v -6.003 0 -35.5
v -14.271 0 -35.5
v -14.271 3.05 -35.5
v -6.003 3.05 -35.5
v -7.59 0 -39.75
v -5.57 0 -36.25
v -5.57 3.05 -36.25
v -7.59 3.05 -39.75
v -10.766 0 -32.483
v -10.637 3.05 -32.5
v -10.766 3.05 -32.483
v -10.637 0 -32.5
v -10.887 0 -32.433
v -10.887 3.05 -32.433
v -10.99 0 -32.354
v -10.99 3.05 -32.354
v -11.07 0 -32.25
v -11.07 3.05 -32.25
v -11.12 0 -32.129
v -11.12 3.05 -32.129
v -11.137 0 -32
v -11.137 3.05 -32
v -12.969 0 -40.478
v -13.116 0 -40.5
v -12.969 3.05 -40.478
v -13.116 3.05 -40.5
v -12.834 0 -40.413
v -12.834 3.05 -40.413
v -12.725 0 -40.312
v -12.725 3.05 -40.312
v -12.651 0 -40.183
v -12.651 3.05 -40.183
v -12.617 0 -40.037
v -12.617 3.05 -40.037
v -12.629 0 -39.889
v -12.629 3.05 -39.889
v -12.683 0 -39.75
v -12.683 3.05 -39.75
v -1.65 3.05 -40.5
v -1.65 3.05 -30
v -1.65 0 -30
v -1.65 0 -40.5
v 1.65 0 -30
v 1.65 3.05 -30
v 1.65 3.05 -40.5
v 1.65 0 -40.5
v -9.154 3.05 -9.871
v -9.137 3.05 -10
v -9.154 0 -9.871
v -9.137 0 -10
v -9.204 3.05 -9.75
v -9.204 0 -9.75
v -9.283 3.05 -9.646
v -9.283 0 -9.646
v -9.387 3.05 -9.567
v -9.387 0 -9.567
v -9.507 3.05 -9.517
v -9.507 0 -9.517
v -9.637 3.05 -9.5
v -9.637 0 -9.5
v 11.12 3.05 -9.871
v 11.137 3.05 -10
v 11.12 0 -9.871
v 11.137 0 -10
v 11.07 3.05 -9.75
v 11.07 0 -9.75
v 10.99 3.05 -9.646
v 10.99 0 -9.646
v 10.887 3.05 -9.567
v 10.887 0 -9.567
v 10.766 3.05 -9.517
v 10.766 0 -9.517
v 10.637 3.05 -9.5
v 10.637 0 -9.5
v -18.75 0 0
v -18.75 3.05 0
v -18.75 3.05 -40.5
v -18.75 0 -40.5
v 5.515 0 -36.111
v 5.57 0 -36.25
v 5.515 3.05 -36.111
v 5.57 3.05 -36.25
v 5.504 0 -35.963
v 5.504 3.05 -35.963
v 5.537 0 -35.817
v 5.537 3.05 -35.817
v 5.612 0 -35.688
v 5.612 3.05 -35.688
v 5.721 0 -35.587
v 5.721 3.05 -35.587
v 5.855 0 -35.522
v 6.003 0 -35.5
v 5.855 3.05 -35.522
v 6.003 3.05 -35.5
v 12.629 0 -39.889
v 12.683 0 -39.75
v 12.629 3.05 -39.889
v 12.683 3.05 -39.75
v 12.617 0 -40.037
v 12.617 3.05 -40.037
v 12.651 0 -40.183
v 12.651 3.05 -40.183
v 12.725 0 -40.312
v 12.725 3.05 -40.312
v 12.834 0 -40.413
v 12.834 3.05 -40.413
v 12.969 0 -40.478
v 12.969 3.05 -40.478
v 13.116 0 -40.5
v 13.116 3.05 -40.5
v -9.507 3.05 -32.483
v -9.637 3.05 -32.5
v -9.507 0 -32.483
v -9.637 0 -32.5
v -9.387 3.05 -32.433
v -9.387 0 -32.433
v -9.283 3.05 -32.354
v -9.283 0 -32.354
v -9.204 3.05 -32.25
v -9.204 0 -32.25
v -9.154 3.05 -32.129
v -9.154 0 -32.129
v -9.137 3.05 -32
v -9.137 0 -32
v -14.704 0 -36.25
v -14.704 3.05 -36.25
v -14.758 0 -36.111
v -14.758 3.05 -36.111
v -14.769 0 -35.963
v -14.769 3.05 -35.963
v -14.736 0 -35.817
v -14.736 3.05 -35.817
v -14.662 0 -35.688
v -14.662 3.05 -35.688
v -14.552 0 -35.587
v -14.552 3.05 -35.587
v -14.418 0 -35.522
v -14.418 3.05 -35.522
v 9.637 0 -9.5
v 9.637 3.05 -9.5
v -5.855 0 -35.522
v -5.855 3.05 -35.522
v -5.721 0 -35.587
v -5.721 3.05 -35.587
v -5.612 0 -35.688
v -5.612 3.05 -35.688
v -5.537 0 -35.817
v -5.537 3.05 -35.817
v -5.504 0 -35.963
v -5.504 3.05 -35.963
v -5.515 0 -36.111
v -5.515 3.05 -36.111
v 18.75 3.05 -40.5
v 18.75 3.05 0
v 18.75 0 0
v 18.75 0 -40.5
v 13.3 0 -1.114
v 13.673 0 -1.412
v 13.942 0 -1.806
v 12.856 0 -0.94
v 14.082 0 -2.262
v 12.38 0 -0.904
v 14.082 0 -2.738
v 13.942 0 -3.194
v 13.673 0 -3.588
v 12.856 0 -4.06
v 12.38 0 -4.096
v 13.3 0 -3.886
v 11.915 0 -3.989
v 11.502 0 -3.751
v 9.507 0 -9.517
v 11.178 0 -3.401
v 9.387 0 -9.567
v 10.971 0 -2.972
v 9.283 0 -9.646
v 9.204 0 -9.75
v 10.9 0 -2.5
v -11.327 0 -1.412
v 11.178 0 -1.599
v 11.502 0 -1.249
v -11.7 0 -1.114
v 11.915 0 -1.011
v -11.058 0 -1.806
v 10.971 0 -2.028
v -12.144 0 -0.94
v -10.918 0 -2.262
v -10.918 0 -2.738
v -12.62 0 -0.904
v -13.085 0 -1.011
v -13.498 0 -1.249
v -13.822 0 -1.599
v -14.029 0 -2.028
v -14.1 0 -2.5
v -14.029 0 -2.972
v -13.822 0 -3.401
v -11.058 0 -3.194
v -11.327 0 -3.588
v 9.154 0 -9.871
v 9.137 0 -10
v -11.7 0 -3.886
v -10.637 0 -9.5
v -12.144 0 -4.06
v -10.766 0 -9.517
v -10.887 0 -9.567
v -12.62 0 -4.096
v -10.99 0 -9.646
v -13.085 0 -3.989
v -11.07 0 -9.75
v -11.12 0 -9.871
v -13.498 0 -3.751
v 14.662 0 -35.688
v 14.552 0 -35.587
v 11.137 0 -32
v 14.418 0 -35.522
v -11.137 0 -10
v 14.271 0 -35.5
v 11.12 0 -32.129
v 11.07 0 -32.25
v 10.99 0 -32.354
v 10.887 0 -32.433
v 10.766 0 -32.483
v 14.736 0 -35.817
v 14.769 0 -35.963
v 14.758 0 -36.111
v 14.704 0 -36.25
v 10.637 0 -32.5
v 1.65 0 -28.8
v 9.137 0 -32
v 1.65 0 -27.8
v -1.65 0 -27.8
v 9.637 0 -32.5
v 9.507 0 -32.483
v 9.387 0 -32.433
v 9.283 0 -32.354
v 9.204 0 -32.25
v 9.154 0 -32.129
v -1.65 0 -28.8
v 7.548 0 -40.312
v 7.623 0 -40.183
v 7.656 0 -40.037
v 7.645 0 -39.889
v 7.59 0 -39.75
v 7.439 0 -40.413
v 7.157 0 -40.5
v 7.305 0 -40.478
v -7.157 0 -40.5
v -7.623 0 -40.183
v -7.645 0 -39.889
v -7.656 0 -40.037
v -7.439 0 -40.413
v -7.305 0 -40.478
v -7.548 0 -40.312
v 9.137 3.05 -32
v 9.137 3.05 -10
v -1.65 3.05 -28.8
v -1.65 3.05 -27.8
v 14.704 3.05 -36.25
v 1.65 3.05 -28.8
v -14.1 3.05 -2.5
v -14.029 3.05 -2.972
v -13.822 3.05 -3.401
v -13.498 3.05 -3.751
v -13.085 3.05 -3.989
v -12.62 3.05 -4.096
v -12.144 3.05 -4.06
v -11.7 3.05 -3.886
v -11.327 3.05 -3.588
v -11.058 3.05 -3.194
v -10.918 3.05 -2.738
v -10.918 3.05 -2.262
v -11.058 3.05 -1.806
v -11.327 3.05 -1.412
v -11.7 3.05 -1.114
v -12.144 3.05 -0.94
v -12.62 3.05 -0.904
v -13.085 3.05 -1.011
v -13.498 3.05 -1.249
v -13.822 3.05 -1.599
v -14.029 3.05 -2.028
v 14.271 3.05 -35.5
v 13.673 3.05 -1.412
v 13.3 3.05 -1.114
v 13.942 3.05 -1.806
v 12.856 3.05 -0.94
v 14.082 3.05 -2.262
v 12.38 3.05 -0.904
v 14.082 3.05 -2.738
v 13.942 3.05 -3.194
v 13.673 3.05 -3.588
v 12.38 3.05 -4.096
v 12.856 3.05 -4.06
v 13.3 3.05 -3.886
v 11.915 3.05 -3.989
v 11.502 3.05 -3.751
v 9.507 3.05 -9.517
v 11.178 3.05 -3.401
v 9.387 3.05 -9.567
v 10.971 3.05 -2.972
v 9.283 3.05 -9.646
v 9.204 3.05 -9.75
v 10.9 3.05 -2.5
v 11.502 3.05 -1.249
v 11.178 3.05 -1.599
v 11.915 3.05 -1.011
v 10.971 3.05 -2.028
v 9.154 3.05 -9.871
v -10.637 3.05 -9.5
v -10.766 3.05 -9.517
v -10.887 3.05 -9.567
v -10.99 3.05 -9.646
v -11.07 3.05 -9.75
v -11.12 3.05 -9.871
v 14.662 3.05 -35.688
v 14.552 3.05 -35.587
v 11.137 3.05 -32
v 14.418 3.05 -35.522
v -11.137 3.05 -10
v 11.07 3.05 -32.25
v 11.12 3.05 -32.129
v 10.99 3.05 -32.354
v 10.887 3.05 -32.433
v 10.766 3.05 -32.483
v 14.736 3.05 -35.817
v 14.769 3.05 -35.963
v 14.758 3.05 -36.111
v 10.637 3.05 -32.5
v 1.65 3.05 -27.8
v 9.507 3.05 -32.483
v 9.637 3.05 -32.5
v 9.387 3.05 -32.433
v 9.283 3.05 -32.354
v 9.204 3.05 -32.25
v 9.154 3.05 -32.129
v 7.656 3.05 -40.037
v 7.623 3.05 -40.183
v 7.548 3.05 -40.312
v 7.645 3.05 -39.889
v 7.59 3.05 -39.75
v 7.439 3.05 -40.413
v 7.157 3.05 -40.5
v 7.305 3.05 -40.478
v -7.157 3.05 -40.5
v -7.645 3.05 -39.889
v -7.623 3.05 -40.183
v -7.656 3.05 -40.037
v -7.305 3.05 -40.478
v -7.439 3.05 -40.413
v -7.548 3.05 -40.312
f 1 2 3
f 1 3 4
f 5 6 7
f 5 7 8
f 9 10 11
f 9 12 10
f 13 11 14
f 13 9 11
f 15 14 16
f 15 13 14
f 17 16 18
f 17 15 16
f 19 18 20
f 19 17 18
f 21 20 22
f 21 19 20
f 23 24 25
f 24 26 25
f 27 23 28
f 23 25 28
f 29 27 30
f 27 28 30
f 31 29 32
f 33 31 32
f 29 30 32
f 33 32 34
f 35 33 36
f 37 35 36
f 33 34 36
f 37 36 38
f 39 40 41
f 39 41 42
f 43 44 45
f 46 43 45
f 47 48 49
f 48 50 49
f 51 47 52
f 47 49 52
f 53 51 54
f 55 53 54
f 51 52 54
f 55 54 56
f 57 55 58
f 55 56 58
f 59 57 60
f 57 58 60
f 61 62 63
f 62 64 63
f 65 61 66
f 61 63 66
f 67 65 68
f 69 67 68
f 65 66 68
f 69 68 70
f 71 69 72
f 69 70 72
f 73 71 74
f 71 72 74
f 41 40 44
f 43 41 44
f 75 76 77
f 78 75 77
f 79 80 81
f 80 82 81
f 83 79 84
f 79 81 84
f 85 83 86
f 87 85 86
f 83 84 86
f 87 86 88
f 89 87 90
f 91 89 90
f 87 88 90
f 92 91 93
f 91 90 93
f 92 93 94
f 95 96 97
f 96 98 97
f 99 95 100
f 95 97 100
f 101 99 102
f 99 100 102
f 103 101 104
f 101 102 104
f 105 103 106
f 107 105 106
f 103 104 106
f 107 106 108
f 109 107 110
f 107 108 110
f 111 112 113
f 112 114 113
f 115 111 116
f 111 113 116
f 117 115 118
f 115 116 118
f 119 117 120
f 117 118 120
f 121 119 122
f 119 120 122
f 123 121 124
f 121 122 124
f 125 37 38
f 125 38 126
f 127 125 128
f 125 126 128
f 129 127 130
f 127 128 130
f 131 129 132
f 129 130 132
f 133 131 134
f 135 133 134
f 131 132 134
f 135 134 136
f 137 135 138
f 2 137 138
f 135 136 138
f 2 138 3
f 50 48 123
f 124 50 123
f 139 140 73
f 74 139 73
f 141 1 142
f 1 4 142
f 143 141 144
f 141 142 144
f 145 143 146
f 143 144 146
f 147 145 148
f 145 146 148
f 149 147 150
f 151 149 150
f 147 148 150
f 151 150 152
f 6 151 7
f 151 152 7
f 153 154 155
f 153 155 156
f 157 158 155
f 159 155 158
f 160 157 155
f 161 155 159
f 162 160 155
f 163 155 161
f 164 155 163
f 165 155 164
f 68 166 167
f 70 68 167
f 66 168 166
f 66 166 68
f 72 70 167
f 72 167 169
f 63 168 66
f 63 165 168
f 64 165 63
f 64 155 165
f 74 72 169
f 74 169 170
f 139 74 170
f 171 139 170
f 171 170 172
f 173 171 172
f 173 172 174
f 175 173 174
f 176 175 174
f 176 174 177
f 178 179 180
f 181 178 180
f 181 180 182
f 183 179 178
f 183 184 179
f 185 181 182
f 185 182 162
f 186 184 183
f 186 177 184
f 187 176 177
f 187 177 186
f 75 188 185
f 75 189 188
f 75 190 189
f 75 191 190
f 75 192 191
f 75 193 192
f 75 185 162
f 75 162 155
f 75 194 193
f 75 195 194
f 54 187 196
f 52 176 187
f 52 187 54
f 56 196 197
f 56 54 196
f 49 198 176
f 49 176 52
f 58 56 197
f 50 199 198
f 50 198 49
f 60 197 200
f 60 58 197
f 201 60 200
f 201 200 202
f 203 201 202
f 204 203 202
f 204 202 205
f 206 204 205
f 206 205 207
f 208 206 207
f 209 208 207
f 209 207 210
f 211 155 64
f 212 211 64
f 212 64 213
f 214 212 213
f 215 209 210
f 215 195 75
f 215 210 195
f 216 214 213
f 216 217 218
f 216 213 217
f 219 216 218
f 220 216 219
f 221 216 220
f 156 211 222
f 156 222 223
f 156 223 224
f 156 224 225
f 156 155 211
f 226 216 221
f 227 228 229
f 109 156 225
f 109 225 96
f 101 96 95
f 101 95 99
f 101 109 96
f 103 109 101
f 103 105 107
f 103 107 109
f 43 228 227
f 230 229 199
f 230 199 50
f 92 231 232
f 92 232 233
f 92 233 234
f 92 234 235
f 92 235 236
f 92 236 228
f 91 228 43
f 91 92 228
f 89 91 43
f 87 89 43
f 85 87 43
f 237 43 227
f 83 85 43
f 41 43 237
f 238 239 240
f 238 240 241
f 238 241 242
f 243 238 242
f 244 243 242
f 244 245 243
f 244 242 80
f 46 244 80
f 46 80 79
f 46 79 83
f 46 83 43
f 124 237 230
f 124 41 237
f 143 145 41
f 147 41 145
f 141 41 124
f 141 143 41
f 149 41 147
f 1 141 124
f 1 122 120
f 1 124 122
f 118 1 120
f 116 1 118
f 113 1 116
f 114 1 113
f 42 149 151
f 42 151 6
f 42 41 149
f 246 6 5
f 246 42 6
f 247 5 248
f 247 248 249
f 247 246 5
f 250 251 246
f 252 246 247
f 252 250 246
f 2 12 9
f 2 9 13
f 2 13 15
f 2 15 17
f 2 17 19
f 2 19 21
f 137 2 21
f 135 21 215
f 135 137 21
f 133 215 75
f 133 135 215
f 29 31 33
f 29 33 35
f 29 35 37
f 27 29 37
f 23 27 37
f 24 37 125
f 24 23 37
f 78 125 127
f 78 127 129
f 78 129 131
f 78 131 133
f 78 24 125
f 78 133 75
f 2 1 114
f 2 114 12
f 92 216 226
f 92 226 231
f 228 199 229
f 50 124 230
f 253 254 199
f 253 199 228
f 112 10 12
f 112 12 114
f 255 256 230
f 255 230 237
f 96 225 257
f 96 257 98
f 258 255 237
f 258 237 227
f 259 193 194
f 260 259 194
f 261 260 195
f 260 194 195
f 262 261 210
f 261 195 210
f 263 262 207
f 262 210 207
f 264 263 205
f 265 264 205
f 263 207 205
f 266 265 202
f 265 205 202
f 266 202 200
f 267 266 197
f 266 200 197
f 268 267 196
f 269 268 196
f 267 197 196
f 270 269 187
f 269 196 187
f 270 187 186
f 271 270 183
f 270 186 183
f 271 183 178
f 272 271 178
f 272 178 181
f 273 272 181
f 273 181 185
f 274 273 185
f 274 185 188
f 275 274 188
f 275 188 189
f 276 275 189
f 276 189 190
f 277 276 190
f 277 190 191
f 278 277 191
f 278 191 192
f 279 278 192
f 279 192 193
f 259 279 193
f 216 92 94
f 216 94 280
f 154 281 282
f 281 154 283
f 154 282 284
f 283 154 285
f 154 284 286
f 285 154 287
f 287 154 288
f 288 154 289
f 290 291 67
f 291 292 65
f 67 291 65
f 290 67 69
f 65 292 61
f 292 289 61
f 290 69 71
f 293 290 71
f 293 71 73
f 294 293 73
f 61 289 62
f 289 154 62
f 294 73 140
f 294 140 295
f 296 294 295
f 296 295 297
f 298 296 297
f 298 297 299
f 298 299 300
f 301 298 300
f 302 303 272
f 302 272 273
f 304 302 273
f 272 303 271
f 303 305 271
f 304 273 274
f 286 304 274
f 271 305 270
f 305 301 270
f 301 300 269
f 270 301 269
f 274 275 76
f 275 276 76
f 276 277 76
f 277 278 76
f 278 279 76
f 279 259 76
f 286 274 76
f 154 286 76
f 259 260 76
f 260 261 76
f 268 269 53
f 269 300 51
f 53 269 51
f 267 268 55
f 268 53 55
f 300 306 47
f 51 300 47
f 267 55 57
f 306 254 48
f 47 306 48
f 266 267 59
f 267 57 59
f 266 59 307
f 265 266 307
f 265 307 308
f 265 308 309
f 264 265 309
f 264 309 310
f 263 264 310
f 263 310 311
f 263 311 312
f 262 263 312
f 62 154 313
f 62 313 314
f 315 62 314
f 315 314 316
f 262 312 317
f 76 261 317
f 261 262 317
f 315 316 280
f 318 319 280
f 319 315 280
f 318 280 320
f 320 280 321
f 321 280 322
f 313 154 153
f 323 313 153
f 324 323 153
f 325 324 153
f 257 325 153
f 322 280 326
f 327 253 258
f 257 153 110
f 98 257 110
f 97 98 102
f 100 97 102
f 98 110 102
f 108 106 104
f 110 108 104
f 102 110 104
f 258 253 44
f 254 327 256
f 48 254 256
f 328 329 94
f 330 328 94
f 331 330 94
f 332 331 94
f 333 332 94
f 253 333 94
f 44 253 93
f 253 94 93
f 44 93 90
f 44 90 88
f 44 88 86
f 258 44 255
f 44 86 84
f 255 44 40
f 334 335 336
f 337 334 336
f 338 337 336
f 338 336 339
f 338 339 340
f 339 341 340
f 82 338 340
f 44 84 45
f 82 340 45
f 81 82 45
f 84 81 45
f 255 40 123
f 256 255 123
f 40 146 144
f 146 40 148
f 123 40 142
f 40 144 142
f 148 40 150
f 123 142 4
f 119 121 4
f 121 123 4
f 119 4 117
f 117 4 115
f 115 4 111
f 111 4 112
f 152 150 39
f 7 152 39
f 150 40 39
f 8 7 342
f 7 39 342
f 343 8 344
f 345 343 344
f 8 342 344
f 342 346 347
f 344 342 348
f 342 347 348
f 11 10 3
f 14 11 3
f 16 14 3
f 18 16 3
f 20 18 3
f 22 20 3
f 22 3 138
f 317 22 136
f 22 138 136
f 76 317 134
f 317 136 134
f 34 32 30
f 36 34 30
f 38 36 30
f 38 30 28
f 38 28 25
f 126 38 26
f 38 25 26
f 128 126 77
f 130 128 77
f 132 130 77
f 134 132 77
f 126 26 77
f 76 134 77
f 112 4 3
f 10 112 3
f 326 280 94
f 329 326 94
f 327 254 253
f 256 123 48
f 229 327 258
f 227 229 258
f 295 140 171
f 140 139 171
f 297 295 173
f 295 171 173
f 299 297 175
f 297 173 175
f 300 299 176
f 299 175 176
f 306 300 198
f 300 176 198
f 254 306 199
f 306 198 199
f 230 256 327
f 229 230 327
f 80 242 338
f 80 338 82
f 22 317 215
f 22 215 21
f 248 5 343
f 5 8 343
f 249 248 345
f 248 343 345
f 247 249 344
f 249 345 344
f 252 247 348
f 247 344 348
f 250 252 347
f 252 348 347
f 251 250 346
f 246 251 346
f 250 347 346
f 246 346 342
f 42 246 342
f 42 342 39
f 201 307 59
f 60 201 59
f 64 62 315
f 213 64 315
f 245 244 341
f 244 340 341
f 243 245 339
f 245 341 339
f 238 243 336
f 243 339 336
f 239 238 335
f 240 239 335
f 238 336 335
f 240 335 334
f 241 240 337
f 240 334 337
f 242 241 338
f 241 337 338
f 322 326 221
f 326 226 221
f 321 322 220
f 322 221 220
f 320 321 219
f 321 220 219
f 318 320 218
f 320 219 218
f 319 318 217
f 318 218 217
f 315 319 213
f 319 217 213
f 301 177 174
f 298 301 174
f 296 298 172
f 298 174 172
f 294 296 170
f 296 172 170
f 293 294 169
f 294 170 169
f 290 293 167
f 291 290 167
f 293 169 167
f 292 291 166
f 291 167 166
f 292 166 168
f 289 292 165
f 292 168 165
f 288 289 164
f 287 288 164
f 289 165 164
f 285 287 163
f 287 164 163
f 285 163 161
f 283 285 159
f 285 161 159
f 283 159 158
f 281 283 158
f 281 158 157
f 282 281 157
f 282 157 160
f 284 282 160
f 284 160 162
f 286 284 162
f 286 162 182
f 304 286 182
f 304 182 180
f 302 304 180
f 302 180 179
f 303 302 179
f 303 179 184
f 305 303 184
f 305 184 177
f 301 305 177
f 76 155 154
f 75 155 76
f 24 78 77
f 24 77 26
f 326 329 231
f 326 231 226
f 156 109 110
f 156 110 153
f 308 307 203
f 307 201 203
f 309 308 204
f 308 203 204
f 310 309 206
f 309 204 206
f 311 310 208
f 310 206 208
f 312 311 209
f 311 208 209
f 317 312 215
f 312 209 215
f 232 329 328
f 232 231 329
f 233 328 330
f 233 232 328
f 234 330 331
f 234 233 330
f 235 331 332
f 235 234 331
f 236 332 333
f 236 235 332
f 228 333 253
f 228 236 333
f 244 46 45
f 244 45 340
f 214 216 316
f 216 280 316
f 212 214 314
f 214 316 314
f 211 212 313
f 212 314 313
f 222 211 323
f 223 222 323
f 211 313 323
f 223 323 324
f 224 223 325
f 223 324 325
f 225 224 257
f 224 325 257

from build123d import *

# Parameters (mm, degrees)
BOSS_EXTRUDE1_DEPTH                = 3.05
FILLET3_R                          = 0.5
SKETCH2_W                          = 3.3
SKETCH2_H                          = 46
SKETCH2_H_2                        = 1
CUT_EXTRUDE1_DEPTH                 = 45.945689448
SKETCH6_W                          = 2
SKETCH6_H                          = 23
CUT_EXTRUDE2_DEPTH                 = 45.945689448
FILLET4_R                          = 0.5
M3_CLEARANCE_HEAD_MOUNTING_HOLES_D = 3.2
SKETCH7_W                          = 0.5
SKETCH7_H                          = 40.5
CUT_EXTRUDE3_DEPTH                 = 45.945689448


with BuildPart() as part:
    # Sketch1 → Boss-Extrude1 (new body)
    with BuildSketch(Plane(origin=(0, 0, 0), x_dir=(1, 0, 0), z_dir=(0, 1, 0))):
        Polygon((-19.25, 0), (-19.25, 40.5), (-12.25, 40.5), (-15.136751346, 35.5), (-5.136751346, 35.5), (-8.023502692, 40.5), (8.023502692, 40.5), (5.136751346, 35.5), (15.136751346, 35.5), (12.25, 40.5), (19.25, 40.5), (19.25, 0), align=None)
    extrude(amount=BOSS_EXTRUDE1_DEPTH)

    # Fillet3
    fillet3_edges = [part.edges().sort_by_distance(p)[0] for p in [
        (-12.25, 1.525, -40.5),
        (-15.136751346, 1.525, -35.5),
        (-5.136751346, 1.525, -35.5),
        (-8.023502692, 1.525, -40.5),
        (8.023502692, 1.525, -40.5),
        (5.136751346, 1.525, -35.5),
        (15.136751346, 1.525, -35.5),
        (12.25, 1.525, -40.5),
    ]]
    fillet(fillet3_edges, radius=FILLET3_R)

    # Sketch2 → Cut-Extrude1 (cut, through all)
    with BuildSketch(Plane(origin=(0, 3.05, 0), x_dir=(1, 0, 0), z_dir=(0, 1, 0))):
        with Locations((0, 53)):
            Rectangle(SKETCH2_W, SKETCH2_H)
        with Locations((0, 28.3)):
            Rectangle(SKETCH2_W, SKETCH2_H_2)
    extrude(amount=-CUT_EXTRUDE1_DEPTH, mode=Mode.SUBTRACT)

    # Sketch6 → Cut-Extrude2 (cut, through all)
    with BuildSketch(Plane(origin=(0, 3.05, 0), x_dir=(1, 0, 0), z_dir=(0, 1, 0))):
        with Locations((-10.136751346, 21)):
            Rectangle(SKETCH6_W, SKETCH6_H)
        with Locations((10.136751346, 21)):
            Rectangle(SKETCH6_W, SKETCH6_H)
    extrude(amount=-CUT_EXTRUDE2_DEPTH, mode=Mode.SUBTRACT)

    # Fillet4
    fillet4_edges = [part.edges().sort_by_distance(p)[0] for p in [
        (-11.136751346, 1.525, -9.5),
        (-11.136751346, 1.525, -32.5),
        (-9.136751346, 1.525, -32.5),
        (-9.136751346, 1.525, -9.5),
        (11.136751346, 1.525, -32.5),
        (11.136751346, 1.525, -9.5),
        (9.136751346, 1.525, -9.5),
        (9.136751346, 1.525, -32.5),
    ]]
    fillet(fillet4_edges, radius=FILLET4_R)

    # M3 Clearance Head Mounting Holes (through all)
    with Locations(Plane(origin=(0, 3.05, 0), x_dir=(1, 0, 0), z_dir=(0, 1, 0))):
        with Locations((-12.5, 2.5), (12.5, 2.5)):
            Hole(M3_CLEARANCE_HEAD_MOUNTING_HOLES_D / 2)

    # Sketch7 → Cut-Extrude3 (cut, through all)
    with BuildSketch(Plane(origin=(0, 3.05, 0), x_dir=(1, 0, 0), z_dir=(0, 1, 0))):
        with Locations((-19, 20.25)):
            Rectangle(SKETCH7_W, SKETCH7_H)
        with Locations((19, 20.25)):
            Rectangle(SKETCH7_W, SKETCH7_H)
    extrude(amount=-CUT_EXTRUDE3_DEPTH, mode=Mode.SUBTRACT)


solid = part.part
